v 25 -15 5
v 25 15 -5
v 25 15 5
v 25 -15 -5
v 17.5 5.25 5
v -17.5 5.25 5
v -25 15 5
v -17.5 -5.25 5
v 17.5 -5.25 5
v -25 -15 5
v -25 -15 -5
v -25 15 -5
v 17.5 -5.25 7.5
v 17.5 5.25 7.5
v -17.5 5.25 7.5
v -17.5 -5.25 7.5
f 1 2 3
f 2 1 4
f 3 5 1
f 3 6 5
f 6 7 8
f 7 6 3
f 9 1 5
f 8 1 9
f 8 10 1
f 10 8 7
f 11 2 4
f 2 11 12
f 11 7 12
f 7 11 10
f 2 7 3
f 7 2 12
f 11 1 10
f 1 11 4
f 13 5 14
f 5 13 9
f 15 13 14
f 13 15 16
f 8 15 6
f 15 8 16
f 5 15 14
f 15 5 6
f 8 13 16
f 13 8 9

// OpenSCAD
// Parameters
body_length = 50; //[25:100:1]
body_width  = 30; //[15:60:1]
body_height = 10; //[5:20:1]

eps = 0.01;

// Ensure visible, non-degenerate geometry and one connected solid
color([0.85, 0.85, 0.8])
union() {
    // Main body
    cube([body_length, body_width, body_height], center=true);

    // Connected top rib (adds clear 3D detail; overlaps slightly to guarantee connectivity)
    rib_h = max(2, body_height * 0.35);
    rib_w = body_width * 0.35;
    rib_l = body_length * 0.70;

    translate([0, 0, body_height/2 + rib_h/2 - 1])
        cube([rib_l, rib_w, rib_h], center=true);
}
